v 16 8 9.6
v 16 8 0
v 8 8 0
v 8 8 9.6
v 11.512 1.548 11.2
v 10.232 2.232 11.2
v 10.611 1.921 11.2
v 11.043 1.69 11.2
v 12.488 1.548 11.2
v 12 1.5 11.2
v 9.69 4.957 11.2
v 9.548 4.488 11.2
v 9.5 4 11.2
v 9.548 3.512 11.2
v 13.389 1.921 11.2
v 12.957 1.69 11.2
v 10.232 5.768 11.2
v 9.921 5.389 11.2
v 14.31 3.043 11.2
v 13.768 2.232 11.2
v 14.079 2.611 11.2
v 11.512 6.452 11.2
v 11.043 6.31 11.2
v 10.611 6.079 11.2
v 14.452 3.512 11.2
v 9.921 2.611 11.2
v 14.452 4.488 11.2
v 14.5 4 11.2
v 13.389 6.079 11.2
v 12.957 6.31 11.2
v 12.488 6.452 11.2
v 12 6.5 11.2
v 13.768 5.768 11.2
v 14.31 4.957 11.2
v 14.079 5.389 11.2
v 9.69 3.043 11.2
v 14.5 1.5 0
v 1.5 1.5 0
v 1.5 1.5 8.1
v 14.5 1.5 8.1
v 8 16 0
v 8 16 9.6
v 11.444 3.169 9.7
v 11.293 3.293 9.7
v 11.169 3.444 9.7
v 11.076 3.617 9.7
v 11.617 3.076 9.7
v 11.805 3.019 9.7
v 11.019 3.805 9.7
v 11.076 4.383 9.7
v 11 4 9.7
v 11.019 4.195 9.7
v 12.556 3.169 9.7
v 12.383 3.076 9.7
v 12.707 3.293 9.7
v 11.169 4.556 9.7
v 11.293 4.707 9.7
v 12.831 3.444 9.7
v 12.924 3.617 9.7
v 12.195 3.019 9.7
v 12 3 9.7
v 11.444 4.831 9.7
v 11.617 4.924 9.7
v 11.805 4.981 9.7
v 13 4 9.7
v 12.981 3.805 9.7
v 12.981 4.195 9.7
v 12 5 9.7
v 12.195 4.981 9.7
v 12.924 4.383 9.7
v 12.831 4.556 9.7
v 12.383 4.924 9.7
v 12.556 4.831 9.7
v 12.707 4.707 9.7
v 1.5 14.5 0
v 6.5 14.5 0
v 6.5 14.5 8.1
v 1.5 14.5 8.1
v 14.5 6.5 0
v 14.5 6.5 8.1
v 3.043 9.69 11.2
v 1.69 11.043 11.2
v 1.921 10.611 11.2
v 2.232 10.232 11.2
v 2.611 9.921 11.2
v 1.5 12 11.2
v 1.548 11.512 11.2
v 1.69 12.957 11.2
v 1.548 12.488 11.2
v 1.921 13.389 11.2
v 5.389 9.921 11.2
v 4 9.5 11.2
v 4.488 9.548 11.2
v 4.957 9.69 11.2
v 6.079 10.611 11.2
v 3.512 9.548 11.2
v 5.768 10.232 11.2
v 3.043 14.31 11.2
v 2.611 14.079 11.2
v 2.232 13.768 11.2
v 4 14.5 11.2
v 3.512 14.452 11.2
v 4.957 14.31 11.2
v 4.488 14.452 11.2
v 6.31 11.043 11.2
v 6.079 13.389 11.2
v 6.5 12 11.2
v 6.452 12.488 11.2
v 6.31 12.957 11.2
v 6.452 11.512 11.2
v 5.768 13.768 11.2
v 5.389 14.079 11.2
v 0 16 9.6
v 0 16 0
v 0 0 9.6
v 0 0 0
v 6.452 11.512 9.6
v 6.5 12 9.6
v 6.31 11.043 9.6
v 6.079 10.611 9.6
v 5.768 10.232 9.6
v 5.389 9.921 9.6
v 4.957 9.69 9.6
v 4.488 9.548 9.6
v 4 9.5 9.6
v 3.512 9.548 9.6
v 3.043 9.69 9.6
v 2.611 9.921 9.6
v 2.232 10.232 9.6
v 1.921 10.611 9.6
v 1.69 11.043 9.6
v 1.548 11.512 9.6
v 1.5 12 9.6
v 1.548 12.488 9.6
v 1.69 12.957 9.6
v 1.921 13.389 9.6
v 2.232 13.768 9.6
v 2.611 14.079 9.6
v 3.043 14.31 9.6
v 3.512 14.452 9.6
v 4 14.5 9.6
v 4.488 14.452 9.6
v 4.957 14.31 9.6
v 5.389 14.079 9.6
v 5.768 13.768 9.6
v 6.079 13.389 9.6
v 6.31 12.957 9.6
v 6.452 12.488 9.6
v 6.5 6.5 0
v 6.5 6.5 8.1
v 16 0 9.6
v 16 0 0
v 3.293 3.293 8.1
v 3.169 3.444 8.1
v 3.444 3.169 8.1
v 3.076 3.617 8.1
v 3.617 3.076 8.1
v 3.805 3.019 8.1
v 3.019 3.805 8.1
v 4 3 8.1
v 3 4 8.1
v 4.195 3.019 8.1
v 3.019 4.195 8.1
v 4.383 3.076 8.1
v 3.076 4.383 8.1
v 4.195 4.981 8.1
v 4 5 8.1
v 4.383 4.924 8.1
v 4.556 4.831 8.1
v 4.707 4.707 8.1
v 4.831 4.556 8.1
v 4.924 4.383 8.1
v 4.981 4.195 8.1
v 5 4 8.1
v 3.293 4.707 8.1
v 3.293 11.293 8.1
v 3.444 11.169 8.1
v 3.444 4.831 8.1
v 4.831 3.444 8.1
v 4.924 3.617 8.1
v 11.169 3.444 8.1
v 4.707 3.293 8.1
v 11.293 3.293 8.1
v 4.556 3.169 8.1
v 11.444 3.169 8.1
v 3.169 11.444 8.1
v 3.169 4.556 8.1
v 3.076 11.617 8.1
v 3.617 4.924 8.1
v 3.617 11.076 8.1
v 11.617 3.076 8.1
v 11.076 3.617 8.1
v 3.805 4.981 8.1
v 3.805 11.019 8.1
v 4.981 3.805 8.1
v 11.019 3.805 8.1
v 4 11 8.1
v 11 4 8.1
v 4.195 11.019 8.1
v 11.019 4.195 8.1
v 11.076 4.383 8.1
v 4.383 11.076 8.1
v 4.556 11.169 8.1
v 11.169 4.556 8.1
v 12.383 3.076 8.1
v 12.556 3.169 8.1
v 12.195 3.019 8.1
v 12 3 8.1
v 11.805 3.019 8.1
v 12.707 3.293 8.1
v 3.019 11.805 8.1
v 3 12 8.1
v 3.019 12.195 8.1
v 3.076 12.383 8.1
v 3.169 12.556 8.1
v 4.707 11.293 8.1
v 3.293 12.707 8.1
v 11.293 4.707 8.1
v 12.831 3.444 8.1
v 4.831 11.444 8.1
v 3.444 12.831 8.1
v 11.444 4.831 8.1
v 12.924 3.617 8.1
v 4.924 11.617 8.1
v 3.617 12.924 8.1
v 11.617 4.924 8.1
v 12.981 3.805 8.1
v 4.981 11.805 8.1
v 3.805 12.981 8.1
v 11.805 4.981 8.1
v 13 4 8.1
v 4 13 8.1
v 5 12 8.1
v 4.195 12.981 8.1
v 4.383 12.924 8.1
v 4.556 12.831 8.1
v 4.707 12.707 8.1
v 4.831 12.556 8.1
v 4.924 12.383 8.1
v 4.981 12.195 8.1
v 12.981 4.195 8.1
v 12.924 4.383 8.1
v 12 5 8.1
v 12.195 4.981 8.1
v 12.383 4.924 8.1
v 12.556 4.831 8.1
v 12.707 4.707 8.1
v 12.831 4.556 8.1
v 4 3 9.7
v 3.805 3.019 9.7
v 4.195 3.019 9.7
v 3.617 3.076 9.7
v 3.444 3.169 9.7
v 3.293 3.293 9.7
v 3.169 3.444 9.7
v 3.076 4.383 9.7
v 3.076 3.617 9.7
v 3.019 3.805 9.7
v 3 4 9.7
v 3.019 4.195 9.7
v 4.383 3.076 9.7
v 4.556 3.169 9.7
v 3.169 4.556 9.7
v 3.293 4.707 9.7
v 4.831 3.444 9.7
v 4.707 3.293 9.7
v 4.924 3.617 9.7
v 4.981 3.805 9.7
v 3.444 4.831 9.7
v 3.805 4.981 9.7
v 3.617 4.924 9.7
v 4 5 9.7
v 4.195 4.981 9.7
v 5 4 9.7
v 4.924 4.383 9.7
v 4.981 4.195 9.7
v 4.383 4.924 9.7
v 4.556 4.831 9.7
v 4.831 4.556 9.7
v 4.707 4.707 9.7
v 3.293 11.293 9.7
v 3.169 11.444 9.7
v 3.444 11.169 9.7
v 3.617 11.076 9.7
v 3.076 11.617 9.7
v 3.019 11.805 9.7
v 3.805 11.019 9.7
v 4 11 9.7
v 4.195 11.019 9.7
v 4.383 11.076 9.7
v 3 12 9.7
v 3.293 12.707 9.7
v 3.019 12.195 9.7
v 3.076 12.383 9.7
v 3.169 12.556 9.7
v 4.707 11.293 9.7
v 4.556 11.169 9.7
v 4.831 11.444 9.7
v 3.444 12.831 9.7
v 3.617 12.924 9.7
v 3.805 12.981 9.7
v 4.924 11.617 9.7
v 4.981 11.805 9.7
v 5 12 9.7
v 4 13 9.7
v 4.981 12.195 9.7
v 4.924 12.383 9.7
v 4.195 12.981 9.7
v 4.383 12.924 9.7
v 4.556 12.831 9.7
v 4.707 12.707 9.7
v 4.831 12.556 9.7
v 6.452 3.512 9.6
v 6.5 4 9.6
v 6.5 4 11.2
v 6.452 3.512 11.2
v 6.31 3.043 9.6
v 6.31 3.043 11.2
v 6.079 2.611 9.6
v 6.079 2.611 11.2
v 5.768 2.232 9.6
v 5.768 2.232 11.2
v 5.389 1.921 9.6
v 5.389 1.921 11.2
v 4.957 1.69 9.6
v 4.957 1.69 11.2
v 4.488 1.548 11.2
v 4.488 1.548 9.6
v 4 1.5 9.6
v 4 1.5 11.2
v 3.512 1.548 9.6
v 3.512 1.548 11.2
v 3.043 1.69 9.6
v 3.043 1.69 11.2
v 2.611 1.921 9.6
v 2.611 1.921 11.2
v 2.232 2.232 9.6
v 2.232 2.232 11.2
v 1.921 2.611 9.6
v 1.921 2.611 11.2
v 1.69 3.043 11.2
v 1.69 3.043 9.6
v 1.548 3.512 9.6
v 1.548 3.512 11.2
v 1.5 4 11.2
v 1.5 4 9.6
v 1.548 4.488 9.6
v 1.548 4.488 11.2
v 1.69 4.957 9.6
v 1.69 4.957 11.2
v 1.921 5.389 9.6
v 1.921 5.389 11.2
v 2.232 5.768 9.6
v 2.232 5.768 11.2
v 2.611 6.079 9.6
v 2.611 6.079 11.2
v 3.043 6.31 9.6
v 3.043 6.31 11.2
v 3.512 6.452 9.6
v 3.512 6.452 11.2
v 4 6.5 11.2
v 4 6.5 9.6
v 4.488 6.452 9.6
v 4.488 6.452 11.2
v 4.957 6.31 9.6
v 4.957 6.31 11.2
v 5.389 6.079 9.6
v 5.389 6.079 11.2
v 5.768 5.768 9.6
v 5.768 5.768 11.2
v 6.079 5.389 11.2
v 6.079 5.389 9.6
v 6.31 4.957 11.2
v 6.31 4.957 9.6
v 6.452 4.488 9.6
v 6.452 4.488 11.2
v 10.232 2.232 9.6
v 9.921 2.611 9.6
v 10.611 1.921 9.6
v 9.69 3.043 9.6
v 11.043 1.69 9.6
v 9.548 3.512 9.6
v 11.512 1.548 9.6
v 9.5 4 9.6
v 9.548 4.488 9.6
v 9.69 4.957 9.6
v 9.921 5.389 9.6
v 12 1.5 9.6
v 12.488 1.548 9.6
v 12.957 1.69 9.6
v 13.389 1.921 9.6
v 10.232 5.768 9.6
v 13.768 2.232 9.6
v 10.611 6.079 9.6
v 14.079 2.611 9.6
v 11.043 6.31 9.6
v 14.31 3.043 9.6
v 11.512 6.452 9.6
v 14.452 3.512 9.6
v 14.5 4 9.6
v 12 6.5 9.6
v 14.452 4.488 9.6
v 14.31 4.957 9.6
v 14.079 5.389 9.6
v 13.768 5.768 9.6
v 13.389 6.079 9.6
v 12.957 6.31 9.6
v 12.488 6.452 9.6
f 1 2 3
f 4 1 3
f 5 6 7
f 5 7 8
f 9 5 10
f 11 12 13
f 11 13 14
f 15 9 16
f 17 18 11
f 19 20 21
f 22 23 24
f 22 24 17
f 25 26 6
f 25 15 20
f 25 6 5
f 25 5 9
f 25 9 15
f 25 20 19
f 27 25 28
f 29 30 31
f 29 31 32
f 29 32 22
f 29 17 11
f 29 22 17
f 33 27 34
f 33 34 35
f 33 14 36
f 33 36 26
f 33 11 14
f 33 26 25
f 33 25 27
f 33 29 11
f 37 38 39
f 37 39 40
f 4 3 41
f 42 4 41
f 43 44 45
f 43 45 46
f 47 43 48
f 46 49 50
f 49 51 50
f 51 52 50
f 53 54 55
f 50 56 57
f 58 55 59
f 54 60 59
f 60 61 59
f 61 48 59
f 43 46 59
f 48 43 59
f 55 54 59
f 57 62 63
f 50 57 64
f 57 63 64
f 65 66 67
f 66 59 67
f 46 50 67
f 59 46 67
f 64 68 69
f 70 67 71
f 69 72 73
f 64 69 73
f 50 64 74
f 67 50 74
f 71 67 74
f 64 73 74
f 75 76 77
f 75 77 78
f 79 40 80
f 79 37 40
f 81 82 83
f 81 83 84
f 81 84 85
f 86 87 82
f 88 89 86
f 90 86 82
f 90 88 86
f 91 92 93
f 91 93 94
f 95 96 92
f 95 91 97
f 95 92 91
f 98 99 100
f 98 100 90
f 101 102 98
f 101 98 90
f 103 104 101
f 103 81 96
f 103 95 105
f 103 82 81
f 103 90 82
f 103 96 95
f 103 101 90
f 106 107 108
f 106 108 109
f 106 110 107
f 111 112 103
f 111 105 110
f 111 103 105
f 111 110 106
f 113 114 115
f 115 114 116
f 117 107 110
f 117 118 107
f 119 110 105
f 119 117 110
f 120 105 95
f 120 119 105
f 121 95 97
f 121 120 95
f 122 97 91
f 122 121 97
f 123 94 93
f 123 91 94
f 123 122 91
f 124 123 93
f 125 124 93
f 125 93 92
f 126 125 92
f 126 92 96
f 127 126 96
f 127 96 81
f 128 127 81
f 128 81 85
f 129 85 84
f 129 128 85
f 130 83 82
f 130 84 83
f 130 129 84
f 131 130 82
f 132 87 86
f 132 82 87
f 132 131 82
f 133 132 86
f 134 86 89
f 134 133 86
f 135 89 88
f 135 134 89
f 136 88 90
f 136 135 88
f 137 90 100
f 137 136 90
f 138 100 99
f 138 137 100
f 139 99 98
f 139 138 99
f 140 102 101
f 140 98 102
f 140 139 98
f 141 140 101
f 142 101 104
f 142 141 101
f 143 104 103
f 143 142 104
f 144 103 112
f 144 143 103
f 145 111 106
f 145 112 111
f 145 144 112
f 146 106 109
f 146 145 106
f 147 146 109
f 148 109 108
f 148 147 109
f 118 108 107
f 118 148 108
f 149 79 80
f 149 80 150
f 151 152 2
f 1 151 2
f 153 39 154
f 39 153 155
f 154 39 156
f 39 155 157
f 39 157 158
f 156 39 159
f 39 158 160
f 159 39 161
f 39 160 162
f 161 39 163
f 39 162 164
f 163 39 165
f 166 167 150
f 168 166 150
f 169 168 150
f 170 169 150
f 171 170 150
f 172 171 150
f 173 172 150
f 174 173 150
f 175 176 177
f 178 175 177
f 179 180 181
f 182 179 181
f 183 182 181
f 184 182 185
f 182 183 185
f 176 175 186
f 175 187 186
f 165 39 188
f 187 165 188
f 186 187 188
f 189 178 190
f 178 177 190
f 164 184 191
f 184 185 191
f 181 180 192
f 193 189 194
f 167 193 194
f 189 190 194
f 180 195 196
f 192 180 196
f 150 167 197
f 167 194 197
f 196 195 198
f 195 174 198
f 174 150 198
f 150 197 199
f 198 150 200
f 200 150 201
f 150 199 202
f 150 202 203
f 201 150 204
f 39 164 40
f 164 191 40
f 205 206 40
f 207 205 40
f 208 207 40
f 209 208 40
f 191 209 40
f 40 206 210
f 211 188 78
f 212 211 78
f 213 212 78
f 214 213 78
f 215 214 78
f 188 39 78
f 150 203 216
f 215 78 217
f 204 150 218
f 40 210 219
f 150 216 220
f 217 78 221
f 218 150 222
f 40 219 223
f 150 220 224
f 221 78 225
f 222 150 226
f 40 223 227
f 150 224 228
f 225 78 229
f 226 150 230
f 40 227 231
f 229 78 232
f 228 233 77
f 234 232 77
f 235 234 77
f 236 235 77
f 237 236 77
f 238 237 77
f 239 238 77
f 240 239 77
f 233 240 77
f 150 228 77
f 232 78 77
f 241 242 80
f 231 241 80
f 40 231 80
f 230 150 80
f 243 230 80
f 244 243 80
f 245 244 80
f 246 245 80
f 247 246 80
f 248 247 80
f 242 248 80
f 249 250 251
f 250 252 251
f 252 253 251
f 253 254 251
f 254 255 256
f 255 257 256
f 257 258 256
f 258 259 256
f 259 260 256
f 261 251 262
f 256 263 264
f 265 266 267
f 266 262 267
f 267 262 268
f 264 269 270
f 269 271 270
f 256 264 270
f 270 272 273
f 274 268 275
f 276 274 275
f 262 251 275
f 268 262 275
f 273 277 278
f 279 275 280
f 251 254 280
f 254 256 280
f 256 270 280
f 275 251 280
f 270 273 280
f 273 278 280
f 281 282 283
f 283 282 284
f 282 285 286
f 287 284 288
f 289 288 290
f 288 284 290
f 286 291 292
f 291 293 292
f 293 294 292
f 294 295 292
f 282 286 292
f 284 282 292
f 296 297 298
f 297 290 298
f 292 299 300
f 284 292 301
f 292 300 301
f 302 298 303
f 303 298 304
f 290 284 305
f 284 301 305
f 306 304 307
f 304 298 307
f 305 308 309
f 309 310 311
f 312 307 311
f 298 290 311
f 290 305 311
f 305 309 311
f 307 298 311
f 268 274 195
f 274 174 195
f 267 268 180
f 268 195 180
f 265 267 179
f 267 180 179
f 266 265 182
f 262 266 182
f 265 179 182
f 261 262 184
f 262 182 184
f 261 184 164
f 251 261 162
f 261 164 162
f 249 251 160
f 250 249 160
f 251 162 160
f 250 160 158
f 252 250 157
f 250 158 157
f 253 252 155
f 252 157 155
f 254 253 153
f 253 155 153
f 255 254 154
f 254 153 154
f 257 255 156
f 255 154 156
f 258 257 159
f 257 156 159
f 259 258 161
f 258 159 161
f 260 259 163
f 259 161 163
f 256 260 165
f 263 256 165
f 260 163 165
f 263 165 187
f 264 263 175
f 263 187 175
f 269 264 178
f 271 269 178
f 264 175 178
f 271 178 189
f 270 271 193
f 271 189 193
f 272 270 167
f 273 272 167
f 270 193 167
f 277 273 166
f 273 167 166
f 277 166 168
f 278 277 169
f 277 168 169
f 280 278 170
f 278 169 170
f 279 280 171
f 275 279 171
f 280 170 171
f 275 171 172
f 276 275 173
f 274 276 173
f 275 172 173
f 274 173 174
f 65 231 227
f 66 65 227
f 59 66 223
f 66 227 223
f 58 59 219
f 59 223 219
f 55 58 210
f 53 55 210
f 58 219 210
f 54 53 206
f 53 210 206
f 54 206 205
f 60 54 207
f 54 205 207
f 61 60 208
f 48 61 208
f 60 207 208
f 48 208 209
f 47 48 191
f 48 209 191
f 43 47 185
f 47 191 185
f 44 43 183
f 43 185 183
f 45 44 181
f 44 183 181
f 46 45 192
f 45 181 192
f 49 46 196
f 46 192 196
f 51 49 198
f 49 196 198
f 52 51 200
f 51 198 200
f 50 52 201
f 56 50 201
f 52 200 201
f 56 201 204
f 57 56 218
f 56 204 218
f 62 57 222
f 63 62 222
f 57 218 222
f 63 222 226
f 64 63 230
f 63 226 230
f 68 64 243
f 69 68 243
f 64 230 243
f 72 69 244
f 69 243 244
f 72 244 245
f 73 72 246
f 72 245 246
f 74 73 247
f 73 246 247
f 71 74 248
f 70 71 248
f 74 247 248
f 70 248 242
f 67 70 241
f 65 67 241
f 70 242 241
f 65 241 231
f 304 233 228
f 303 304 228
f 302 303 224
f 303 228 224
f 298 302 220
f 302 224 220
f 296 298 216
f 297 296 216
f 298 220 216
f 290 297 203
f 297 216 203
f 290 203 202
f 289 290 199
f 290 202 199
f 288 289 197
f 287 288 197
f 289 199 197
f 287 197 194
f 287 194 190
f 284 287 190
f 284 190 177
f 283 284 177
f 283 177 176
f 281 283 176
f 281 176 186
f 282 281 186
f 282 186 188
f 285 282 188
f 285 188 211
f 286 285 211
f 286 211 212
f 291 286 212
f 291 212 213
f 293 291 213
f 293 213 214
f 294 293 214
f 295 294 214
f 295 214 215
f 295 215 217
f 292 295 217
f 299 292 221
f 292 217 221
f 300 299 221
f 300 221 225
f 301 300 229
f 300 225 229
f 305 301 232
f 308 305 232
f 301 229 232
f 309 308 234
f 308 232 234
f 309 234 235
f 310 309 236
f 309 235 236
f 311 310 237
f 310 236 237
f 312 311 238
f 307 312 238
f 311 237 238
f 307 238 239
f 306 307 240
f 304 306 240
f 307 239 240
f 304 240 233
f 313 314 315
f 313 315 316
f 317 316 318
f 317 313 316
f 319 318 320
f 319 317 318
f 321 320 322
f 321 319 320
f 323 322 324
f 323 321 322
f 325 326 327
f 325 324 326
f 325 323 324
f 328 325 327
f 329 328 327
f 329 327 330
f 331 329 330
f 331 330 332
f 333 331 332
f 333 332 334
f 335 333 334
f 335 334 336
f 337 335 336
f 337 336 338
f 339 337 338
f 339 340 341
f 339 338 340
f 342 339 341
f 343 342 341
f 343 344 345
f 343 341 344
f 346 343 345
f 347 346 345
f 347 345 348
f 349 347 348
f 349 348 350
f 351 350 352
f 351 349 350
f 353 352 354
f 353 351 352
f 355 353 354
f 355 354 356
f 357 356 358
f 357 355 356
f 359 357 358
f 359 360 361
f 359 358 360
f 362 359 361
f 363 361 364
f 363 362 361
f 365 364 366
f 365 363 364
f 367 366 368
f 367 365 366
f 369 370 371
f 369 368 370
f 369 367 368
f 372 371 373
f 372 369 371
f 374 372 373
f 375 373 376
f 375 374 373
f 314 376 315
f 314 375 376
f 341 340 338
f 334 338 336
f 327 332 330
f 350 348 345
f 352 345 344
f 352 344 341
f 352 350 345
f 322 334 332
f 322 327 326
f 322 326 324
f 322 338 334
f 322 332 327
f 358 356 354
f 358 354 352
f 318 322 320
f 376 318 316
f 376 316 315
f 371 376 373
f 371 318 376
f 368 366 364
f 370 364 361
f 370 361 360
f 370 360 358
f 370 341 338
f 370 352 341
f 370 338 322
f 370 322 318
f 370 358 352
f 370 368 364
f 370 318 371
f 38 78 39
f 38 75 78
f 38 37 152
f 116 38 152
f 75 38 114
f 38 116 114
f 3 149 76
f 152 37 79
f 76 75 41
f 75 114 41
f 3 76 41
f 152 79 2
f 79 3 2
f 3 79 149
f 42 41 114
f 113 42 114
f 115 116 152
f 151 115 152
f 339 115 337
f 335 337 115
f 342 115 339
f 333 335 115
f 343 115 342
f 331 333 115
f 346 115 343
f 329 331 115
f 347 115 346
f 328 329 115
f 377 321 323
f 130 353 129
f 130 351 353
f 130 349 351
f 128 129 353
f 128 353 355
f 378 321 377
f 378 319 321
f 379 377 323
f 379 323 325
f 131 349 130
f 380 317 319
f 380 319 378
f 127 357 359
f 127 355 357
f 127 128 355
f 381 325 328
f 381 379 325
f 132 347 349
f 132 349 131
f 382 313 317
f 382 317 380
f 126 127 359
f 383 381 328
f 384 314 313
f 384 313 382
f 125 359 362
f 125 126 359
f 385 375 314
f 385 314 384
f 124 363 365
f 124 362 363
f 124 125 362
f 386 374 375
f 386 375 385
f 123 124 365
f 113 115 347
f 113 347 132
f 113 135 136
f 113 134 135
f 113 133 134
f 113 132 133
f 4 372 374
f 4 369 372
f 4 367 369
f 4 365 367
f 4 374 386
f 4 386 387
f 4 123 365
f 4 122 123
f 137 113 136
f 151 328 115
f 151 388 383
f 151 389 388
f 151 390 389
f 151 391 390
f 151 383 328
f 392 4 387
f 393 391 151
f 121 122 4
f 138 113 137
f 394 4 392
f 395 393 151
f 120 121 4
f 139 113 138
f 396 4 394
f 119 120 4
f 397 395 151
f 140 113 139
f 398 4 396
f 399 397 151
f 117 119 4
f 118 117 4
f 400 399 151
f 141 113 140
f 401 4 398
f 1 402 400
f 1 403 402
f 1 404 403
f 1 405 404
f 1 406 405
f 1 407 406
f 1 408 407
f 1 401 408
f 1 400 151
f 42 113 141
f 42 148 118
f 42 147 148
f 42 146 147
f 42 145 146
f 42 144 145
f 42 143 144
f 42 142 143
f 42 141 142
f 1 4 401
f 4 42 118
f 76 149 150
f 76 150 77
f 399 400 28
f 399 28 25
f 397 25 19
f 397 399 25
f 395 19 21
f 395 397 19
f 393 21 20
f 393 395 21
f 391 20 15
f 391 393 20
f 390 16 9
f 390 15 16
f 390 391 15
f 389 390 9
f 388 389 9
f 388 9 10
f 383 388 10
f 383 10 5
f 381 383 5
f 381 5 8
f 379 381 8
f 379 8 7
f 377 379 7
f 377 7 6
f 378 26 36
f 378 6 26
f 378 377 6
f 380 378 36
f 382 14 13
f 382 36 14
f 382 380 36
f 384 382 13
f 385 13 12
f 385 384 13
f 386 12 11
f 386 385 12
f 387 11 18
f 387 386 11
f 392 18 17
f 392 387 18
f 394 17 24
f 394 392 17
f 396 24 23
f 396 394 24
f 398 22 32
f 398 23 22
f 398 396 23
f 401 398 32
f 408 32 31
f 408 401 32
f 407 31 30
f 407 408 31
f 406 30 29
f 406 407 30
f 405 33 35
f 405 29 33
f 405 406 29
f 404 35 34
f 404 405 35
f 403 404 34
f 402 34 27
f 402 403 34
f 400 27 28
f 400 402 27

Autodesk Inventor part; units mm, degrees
ref_plane "YZ Plane" through (0, 0, 0) normal (1, 0, 0) x (0, 1, 0)
ref_plane "XZ Plane" through (0, 0, 0) normal (0, 1, 0) x (-1, 0, 0)
ref_plane "XY Plane" through (0, 0, 0) normal (0, 0, 1) x (1, 0, 0)
sketch "Sketch1" plane through (0, 0, 0) normal (0, 0, 1) x (1, 0, 0)
  line L0 (0, 0) -> (16, 0)
  line L1 (16, 0) -> (16, 8)
  line L2 (16, 8) -> (8, 8)
  line L3 (8, 8) -> (8, 16)
  line L4 (8, 16) -> (0, 16)
  line L5 (0, 16) -> (0, 0)
  dimension "d0" = 16
  dimension "d1" = 16
  dimension "d2" = 8
  dimension "d3" = 8
extrude "Extrusion1" add sketch "Sketch1" along normal blind 9.6
sketch "Sketch2" plane through (0, 0, 9.6) normal (0, 0, 1) x (1, 0, 0)
  line L0 (16, 8) -> (16, 0) projected
  line L1 (8, 8) -> (16, 8) projected
  line L2 (8, 16) -> (8, 8) projected
  line L3 (0, 16) -> (8, 16) projected
  circle A0 centre (4, 12) radius 2.5
  circle A1 centre (4, 4) radius 2.5
  circle A2 centre (12, 4) radius 2.5
  point P0 (4, 16)
  point P1 (16, 4)
  point P2 (8, 12)
  point P3 (12, 8)
  dimension "d6" = 5
extrude "Extrusion2" add sketch "Sketch2" along normal blind 1.6
shell "Shell1" thickness 1.5 removed faces 1 at (2.6667, 8, 0)
equation "\"d0\" = d1"
equation "\"d2\" = 0.5 * d1"
equation "\"d3\" = d2"
properties part number "2357" material "Steel"
